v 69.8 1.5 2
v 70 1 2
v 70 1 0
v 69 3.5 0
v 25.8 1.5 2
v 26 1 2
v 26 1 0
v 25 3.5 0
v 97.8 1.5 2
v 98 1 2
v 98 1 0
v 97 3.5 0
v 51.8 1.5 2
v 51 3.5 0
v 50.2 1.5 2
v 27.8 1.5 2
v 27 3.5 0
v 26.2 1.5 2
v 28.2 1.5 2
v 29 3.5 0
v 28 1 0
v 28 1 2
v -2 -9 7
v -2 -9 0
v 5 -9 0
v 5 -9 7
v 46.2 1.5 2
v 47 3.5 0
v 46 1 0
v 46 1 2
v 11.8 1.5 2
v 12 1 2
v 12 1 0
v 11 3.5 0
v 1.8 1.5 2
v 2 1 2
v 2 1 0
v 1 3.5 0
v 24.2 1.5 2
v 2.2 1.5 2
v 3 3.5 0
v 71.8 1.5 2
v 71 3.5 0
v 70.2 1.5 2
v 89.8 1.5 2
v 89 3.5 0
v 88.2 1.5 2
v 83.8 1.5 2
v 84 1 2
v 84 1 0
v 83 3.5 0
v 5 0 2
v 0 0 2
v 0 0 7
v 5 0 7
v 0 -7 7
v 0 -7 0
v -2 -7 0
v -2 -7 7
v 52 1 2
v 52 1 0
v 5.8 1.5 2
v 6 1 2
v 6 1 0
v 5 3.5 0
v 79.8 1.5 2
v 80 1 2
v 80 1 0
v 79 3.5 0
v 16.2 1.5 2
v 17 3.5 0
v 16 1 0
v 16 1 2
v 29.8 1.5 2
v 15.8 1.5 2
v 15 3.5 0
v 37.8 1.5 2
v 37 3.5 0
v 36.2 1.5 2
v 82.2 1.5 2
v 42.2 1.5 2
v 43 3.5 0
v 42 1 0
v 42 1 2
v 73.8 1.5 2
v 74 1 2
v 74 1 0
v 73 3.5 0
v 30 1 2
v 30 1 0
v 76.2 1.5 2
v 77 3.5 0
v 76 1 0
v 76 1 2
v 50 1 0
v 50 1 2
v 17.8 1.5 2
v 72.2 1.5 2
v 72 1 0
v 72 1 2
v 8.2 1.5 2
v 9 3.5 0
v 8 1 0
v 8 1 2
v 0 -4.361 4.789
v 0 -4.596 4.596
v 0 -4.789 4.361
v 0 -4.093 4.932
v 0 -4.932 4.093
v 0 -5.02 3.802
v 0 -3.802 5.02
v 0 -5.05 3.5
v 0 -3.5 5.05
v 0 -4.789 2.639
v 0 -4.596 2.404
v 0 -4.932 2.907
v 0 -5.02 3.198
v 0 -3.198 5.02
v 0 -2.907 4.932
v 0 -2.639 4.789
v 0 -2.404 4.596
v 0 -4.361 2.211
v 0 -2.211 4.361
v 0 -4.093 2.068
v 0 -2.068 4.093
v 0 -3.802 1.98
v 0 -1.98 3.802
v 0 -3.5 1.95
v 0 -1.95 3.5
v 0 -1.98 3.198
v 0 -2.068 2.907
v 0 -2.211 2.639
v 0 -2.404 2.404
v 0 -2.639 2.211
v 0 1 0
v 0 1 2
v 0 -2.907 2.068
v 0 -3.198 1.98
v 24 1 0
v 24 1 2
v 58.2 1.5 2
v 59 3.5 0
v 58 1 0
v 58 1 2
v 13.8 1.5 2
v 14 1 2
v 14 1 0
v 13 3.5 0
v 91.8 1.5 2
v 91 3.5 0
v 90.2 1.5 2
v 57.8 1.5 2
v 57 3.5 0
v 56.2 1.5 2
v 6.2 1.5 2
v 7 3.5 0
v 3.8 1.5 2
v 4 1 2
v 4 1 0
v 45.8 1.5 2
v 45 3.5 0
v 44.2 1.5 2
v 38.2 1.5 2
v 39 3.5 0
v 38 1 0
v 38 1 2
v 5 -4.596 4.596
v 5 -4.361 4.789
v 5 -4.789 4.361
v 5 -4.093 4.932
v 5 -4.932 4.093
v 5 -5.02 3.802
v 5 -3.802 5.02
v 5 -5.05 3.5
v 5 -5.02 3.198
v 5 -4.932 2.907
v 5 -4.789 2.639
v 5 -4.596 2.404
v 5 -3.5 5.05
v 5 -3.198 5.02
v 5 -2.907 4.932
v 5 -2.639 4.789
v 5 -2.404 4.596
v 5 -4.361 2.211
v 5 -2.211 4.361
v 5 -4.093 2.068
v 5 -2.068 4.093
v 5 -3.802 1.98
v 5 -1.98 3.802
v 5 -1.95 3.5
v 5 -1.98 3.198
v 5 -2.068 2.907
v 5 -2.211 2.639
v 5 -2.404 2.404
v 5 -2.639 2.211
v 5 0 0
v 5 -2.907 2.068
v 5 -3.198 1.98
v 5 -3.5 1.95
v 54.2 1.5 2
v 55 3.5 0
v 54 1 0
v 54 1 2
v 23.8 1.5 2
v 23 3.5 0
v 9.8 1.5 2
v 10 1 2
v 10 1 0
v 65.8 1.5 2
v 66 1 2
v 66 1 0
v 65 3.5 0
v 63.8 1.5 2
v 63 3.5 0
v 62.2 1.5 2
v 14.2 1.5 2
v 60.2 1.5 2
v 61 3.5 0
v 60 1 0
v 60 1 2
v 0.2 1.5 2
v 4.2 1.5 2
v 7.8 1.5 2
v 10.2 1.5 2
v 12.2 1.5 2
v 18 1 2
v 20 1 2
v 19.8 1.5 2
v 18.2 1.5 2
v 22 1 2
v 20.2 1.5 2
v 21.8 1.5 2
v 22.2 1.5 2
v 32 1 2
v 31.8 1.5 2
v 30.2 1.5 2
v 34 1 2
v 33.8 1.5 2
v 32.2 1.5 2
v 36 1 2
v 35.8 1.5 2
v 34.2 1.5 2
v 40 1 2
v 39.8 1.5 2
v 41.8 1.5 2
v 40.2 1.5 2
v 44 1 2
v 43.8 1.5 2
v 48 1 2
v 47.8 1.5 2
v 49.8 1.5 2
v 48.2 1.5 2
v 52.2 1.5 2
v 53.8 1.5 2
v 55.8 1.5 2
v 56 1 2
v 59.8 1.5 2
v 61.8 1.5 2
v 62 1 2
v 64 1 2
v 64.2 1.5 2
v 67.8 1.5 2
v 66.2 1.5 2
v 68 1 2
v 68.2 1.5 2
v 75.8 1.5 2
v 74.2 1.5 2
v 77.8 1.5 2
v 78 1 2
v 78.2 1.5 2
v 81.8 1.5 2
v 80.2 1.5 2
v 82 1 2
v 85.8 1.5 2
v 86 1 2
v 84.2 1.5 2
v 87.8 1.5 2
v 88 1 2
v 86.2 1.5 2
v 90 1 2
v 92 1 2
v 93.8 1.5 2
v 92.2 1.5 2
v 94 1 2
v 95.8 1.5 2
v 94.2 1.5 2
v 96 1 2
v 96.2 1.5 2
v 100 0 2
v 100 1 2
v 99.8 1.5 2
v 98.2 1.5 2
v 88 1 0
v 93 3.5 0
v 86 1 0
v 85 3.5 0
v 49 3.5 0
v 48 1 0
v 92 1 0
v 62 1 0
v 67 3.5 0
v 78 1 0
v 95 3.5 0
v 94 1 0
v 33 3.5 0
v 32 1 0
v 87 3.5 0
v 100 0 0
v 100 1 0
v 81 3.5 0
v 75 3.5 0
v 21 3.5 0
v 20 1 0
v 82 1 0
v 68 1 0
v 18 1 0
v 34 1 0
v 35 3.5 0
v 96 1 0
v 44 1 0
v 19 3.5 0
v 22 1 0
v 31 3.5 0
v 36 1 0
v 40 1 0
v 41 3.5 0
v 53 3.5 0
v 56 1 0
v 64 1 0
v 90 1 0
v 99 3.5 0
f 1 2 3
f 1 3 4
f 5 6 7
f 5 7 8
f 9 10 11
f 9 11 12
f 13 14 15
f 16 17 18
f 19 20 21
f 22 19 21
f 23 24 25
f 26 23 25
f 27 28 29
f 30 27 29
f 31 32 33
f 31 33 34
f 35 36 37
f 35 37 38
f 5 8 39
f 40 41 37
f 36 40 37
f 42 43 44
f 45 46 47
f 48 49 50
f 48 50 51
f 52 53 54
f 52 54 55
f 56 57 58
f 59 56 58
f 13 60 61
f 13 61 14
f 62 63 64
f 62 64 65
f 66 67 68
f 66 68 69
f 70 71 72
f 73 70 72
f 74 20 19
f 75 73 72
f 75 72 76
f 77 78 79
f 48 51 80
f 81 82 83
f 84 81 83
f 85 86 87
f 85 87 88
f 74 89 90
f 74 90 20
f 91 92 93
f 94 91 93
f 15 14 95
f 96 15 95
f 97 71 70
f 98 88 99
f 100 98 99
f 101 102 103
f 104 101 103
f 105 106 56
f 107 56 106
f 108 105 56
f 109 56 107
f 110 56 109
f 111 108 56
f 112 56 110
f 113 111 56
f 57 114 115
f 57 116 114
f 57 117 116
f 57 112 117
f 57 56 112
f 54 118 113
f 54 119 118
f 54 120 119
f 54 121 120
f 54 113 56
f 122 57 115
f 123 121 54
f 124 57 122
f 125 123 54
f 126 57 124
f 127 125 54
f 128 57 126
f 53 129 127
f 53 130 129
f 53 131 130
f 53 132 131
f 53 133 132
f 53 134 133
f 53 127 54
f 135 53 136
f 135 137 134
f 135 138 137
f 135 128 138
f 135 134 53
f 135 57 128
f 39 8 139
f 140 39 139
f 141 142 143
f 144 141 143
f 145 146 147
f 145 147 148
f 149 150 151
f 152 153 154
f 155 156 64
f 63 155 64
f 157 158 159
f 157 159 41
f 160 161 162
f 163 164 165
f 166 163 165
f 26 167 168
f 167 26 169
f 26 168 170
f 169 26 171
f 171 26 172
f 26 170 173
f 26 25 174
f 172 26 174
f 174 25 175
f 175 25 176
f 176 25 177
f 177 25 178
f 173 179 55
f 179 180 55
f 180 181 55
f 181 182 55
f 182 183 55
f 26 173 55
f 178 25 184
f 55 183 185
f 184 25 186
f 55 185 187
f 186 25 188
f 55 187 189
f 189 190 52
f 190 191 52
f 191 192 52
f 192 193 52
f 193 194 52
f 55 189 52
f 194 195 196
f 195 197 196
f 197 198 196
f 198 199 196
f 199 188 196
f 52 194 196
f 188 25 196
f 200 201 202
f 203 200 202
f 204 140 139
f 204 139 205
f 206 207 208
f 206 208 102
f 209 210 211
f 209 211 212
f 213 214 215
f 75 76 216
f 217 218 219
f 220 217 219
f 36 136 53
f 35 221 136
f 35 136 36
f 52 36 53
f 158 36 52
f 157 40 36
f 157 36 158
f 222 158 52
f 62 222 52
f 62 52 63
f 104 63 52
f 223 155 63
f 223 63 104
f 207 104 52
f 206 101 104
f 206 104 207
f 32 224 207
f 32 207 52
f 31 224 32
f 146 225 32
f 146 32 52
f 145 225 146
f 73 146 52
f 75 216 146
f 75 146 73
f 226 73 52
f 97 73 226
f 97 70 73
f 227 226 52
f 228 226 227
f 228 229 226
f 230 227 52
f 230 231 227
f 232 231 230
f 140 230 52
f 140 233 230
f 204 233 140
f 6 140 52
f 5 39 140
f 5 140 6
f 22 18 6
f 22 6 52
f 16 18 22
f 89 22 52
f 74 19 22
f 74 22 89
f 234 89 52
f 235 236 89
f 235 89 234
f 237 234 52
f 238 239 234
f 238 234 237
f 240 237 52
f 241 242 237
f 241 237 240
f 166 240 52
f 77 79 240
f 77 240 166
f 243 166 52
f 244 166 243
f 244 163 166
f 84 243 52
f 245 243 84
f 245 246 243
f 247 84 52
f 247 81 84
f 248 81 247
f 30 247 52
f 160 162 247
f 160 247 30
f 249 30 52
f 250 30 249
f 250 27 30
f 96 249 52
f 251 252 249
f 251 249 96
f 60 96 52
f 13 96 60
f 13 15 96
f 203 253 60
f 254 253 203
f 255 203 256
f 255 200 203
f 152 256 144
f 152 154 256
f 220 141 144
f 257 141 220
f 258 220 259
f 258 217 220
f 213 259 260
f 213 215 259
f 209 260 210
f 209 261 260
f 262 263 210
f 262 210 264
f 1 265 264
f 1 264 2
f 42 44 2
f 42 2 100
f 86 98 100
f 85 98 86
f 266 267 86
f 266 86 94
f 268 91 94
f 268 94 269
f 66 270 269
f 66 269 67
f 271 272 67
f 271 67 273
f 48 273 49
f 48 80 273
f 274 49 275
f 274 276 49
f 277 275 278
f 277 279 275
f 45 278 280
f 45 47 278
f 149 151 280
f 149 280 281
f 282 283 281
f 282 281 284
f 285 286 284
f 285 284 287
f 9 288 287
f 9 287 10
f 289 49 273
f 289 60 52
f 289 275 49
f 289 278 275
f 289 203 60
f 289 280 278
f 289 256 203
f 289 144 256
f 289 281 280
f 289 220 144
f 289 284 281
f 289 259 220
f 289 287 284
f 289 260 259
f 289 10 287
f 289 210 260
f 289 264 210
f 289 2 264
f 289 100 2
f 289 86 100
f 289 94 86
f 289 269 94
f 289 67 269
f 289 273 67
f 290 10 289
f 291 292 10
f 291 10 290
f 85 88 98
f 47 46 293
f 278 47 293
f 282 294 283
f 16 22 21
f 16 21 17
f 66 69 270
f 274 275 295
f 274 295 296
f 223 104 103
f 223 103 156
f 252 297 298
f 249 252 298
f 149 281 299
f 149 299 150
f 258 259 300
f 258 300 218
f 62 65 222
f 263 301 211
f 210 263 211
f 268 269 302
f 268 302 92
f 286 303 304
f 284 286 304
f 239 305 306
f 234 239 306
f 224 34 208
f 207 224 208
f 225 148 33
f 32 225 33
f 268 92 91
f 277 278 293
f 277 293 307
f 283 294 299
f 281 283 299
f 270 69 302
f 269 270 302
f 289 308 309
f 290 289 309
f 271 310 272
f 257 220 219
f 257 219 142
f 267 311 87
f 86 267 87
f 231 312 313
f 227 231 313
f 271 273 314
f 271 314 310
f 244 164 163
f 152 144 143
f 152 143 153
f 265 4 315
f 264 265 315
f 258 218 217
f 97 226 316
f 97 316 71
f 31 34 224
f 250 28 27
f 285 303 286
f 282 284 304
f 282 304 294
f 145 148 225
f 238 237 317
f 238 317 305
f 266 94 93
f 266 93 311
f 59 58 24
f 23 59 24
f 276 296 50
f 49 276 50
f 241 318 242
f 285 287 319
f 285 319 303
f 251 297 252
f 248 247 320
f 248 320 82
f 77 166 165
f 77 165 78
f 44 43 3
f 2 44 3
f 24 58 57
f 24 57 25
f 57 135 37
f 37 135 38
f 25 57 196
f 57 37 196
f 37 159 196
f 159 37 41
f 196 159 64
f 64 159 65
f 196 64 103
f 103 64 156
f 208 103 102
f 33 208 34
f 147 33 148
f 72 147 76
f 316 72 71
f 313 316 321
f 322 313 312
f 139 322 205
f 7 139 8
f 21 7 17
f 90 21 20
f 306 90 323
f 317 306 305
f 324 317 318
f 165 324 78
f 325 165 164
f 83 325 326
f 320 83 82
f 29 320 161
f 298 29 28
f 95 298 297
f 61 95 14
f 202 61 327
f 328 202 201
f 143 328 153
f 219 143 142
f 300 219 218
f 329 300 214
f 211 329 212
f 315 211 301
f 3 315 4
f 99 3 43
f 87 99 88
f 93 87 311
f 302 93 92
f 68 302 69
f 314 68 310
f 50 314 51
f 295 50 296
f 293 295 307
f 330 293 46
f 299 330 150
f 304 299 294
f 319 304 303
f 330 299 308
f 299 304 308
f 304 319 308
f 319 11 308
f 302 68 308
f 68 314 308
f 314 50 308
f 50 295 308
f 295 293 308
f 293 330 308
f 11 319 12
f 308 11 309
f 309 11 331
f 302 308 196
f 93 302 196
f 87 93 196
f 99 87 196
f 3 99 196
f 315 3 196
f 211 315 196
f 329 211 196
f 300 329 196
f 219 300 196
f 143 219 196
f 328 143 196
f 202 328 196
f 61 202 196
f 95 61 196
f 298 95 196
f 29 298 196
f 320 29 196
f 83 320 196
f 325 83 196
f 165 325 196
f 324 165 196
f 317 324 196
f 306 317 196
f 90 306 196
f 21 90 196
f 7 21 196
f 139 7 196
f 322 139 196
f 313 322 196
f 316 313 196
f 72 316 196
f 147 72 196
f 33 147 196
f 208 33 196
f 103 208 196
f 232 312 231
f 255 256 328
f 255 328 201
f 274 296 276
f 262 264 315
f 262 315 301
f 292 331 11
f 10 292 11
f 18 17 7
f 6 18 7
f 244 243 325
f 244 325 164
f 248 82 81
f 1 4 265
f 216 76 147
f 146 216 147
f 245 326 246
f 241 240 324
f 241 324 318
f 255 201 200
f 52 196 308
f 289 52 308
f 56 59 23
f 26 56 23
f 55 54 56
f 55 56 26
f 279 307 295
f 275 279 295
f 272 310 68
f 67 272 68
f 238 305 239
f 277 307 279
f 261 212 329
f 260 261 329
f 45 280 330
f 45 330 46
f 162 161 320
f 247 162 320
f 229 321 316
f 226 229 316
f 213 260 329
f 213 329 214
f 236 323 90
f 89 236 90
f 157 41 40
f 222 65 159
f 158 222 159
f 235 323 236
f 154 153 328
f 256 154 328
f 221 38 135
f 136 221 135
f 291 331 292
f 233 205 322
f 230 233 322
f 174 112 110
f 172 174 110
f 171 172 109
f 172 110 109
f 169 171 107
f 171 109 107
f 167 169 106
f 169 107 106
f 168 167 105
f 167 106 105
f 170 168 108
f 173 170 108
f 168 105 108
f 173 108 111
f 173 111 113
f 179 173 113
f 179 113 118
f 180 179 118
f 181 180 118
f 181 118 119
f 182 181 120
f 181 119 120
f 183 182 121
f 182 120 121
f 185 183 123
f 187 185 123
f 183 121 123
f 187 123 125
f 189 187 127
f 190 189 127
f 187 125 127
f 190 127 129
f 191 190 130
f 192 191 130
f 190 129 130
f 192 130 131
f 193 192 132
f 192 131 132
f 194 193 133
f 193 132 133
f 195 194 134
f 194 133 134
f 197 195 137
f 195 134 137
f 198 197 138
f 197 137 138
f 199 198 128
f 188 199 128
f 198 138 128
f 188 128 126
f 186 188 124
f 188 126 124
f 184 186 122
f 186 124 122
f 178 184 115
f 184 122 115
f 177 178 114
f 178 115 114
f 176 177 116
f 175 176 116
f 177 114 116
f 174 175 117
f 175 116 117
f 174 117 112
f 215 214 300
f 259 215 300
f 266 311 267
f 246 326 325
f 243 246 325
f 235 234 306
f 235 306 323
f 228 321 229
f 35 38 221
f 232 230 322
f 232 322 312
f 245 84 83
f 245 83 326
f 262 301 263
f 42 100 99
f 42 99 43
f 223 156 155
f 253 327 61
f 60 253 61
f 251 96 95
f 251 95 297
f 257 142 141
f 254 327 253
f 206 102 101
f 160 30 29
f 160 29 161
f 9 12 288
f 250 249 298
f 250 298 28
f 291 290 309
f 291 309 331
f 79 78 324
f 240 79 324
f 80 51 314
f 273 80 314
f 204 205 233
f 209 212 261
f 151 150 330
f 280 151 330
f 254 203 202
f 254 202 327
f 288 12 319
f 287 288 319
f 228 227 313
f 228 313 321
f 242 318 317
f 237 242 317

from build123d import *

# Parameters (mm, degrees)
F1_DEPTH = 2
F3_DEPTH = 100.001
F4_W     = 5
F4_H     = 7
F5_DEPTH = 7
F6_R     = 1.55
F7_DEPTH = 5


with BuildPart() as f1:
    # F0 (on Top) → F1 (new body)
    with BuildSketch(Plane.XY):
        Polygon((1, 3.5), (0, 1), (0, 0), (100, 0), (100, 1), (99, 3.5), (98, 1), (97, 3.5), (96, 1), (95, 3.5), (94, 1), (93, 3.5), (92, 1), (91, 3.5), (90, 1), (89, 3.5), (88, 1), (87, 3.5), (86, 1), (85, 3.5), (84, 1), (83, 3.5), (82, 1), (81, 3.5), (80, 1), (79, 3.5), (78, 1), (77, 3.5), (76, 1), (75, 3.5), (74, 1), (73, 3.5), (72, 1), (71, 3.5), (70, 1), (69, 3.5), (68, 1), (67, 3.5), (66, 1), (65, 3.5), (64, 1), (63, 3.5), (62, 1), (61, 3.5), (60, 1), (59, 3.5), (58, 1), (57, 3.5), (56, 1), (55, 3.5), (54, 1), (53, 3.5), (52, 1), (51, 3.5), (50, 1), (49, 3.5), (48, 1), (47, 3.5), (46, 1), (45, 3.5), (44, 1), (43, 3.5), (42, 1), (41, 3.5), (40, 1), (39, 3.5), (38, 1), (37, 3.5), (36, 1), (35, 3.5), (34, 1), (33, 3.5), (32, 1), (31, 3.5), (30, 1), (29, 3.5), (28, 1), (27, 3.5), (26, 1), (25, 3.5), (24, 1), (23, 3.5), (22, 1), (21, 3.5), (20, 1), (19, 3.5), (18, 1), (17, 3.5), (16, 1), (15, 3.5), (14, 1), (13, 3.5), (12, 1), (11, 3.5), (10, 1), (9, 3.5), (8, 1), (7, 3.5), (6, 1), (5, 3.5), (4, 1), (3, 3.5), (2, 1), align=None)
    extrude(amount=F1_DEPTH)

    # F2 (on Right) → F3 (intersect, through all)
    with BuildSketch(Plane.YZ):
        Polygon((0, 3.5), (0, 0), (3.5, 0), align=None)
    extrude(amount=F3_DEPTH, mode=Mode.INTERSECT)

    # F4 (on Top) → F5 (join)
    with BuildSketch(Plane.XY):
        with Locations((2.5, -3.5)):
            Rectangle(F4_W, F4_H)
        Polygon((5, -7), (0, -7), (-2, -7), (-2, -9), (5, -9), align=None)
    extrude(amount=F5_DEPTH)

    # F6 (on face) → F7 (cut, through all)
    with BuildSketch(Plane(origin=(0, 0, 0), x_dir=(0, -1, 0), z_dir=(-1, 0, 0))):
        with Locations((3.5, 3.5)):
            Circle(F6_R)
    extrude(amount=-F7_DEPTH, mode=Mode.SUBTRACT)


solid = f1.part
